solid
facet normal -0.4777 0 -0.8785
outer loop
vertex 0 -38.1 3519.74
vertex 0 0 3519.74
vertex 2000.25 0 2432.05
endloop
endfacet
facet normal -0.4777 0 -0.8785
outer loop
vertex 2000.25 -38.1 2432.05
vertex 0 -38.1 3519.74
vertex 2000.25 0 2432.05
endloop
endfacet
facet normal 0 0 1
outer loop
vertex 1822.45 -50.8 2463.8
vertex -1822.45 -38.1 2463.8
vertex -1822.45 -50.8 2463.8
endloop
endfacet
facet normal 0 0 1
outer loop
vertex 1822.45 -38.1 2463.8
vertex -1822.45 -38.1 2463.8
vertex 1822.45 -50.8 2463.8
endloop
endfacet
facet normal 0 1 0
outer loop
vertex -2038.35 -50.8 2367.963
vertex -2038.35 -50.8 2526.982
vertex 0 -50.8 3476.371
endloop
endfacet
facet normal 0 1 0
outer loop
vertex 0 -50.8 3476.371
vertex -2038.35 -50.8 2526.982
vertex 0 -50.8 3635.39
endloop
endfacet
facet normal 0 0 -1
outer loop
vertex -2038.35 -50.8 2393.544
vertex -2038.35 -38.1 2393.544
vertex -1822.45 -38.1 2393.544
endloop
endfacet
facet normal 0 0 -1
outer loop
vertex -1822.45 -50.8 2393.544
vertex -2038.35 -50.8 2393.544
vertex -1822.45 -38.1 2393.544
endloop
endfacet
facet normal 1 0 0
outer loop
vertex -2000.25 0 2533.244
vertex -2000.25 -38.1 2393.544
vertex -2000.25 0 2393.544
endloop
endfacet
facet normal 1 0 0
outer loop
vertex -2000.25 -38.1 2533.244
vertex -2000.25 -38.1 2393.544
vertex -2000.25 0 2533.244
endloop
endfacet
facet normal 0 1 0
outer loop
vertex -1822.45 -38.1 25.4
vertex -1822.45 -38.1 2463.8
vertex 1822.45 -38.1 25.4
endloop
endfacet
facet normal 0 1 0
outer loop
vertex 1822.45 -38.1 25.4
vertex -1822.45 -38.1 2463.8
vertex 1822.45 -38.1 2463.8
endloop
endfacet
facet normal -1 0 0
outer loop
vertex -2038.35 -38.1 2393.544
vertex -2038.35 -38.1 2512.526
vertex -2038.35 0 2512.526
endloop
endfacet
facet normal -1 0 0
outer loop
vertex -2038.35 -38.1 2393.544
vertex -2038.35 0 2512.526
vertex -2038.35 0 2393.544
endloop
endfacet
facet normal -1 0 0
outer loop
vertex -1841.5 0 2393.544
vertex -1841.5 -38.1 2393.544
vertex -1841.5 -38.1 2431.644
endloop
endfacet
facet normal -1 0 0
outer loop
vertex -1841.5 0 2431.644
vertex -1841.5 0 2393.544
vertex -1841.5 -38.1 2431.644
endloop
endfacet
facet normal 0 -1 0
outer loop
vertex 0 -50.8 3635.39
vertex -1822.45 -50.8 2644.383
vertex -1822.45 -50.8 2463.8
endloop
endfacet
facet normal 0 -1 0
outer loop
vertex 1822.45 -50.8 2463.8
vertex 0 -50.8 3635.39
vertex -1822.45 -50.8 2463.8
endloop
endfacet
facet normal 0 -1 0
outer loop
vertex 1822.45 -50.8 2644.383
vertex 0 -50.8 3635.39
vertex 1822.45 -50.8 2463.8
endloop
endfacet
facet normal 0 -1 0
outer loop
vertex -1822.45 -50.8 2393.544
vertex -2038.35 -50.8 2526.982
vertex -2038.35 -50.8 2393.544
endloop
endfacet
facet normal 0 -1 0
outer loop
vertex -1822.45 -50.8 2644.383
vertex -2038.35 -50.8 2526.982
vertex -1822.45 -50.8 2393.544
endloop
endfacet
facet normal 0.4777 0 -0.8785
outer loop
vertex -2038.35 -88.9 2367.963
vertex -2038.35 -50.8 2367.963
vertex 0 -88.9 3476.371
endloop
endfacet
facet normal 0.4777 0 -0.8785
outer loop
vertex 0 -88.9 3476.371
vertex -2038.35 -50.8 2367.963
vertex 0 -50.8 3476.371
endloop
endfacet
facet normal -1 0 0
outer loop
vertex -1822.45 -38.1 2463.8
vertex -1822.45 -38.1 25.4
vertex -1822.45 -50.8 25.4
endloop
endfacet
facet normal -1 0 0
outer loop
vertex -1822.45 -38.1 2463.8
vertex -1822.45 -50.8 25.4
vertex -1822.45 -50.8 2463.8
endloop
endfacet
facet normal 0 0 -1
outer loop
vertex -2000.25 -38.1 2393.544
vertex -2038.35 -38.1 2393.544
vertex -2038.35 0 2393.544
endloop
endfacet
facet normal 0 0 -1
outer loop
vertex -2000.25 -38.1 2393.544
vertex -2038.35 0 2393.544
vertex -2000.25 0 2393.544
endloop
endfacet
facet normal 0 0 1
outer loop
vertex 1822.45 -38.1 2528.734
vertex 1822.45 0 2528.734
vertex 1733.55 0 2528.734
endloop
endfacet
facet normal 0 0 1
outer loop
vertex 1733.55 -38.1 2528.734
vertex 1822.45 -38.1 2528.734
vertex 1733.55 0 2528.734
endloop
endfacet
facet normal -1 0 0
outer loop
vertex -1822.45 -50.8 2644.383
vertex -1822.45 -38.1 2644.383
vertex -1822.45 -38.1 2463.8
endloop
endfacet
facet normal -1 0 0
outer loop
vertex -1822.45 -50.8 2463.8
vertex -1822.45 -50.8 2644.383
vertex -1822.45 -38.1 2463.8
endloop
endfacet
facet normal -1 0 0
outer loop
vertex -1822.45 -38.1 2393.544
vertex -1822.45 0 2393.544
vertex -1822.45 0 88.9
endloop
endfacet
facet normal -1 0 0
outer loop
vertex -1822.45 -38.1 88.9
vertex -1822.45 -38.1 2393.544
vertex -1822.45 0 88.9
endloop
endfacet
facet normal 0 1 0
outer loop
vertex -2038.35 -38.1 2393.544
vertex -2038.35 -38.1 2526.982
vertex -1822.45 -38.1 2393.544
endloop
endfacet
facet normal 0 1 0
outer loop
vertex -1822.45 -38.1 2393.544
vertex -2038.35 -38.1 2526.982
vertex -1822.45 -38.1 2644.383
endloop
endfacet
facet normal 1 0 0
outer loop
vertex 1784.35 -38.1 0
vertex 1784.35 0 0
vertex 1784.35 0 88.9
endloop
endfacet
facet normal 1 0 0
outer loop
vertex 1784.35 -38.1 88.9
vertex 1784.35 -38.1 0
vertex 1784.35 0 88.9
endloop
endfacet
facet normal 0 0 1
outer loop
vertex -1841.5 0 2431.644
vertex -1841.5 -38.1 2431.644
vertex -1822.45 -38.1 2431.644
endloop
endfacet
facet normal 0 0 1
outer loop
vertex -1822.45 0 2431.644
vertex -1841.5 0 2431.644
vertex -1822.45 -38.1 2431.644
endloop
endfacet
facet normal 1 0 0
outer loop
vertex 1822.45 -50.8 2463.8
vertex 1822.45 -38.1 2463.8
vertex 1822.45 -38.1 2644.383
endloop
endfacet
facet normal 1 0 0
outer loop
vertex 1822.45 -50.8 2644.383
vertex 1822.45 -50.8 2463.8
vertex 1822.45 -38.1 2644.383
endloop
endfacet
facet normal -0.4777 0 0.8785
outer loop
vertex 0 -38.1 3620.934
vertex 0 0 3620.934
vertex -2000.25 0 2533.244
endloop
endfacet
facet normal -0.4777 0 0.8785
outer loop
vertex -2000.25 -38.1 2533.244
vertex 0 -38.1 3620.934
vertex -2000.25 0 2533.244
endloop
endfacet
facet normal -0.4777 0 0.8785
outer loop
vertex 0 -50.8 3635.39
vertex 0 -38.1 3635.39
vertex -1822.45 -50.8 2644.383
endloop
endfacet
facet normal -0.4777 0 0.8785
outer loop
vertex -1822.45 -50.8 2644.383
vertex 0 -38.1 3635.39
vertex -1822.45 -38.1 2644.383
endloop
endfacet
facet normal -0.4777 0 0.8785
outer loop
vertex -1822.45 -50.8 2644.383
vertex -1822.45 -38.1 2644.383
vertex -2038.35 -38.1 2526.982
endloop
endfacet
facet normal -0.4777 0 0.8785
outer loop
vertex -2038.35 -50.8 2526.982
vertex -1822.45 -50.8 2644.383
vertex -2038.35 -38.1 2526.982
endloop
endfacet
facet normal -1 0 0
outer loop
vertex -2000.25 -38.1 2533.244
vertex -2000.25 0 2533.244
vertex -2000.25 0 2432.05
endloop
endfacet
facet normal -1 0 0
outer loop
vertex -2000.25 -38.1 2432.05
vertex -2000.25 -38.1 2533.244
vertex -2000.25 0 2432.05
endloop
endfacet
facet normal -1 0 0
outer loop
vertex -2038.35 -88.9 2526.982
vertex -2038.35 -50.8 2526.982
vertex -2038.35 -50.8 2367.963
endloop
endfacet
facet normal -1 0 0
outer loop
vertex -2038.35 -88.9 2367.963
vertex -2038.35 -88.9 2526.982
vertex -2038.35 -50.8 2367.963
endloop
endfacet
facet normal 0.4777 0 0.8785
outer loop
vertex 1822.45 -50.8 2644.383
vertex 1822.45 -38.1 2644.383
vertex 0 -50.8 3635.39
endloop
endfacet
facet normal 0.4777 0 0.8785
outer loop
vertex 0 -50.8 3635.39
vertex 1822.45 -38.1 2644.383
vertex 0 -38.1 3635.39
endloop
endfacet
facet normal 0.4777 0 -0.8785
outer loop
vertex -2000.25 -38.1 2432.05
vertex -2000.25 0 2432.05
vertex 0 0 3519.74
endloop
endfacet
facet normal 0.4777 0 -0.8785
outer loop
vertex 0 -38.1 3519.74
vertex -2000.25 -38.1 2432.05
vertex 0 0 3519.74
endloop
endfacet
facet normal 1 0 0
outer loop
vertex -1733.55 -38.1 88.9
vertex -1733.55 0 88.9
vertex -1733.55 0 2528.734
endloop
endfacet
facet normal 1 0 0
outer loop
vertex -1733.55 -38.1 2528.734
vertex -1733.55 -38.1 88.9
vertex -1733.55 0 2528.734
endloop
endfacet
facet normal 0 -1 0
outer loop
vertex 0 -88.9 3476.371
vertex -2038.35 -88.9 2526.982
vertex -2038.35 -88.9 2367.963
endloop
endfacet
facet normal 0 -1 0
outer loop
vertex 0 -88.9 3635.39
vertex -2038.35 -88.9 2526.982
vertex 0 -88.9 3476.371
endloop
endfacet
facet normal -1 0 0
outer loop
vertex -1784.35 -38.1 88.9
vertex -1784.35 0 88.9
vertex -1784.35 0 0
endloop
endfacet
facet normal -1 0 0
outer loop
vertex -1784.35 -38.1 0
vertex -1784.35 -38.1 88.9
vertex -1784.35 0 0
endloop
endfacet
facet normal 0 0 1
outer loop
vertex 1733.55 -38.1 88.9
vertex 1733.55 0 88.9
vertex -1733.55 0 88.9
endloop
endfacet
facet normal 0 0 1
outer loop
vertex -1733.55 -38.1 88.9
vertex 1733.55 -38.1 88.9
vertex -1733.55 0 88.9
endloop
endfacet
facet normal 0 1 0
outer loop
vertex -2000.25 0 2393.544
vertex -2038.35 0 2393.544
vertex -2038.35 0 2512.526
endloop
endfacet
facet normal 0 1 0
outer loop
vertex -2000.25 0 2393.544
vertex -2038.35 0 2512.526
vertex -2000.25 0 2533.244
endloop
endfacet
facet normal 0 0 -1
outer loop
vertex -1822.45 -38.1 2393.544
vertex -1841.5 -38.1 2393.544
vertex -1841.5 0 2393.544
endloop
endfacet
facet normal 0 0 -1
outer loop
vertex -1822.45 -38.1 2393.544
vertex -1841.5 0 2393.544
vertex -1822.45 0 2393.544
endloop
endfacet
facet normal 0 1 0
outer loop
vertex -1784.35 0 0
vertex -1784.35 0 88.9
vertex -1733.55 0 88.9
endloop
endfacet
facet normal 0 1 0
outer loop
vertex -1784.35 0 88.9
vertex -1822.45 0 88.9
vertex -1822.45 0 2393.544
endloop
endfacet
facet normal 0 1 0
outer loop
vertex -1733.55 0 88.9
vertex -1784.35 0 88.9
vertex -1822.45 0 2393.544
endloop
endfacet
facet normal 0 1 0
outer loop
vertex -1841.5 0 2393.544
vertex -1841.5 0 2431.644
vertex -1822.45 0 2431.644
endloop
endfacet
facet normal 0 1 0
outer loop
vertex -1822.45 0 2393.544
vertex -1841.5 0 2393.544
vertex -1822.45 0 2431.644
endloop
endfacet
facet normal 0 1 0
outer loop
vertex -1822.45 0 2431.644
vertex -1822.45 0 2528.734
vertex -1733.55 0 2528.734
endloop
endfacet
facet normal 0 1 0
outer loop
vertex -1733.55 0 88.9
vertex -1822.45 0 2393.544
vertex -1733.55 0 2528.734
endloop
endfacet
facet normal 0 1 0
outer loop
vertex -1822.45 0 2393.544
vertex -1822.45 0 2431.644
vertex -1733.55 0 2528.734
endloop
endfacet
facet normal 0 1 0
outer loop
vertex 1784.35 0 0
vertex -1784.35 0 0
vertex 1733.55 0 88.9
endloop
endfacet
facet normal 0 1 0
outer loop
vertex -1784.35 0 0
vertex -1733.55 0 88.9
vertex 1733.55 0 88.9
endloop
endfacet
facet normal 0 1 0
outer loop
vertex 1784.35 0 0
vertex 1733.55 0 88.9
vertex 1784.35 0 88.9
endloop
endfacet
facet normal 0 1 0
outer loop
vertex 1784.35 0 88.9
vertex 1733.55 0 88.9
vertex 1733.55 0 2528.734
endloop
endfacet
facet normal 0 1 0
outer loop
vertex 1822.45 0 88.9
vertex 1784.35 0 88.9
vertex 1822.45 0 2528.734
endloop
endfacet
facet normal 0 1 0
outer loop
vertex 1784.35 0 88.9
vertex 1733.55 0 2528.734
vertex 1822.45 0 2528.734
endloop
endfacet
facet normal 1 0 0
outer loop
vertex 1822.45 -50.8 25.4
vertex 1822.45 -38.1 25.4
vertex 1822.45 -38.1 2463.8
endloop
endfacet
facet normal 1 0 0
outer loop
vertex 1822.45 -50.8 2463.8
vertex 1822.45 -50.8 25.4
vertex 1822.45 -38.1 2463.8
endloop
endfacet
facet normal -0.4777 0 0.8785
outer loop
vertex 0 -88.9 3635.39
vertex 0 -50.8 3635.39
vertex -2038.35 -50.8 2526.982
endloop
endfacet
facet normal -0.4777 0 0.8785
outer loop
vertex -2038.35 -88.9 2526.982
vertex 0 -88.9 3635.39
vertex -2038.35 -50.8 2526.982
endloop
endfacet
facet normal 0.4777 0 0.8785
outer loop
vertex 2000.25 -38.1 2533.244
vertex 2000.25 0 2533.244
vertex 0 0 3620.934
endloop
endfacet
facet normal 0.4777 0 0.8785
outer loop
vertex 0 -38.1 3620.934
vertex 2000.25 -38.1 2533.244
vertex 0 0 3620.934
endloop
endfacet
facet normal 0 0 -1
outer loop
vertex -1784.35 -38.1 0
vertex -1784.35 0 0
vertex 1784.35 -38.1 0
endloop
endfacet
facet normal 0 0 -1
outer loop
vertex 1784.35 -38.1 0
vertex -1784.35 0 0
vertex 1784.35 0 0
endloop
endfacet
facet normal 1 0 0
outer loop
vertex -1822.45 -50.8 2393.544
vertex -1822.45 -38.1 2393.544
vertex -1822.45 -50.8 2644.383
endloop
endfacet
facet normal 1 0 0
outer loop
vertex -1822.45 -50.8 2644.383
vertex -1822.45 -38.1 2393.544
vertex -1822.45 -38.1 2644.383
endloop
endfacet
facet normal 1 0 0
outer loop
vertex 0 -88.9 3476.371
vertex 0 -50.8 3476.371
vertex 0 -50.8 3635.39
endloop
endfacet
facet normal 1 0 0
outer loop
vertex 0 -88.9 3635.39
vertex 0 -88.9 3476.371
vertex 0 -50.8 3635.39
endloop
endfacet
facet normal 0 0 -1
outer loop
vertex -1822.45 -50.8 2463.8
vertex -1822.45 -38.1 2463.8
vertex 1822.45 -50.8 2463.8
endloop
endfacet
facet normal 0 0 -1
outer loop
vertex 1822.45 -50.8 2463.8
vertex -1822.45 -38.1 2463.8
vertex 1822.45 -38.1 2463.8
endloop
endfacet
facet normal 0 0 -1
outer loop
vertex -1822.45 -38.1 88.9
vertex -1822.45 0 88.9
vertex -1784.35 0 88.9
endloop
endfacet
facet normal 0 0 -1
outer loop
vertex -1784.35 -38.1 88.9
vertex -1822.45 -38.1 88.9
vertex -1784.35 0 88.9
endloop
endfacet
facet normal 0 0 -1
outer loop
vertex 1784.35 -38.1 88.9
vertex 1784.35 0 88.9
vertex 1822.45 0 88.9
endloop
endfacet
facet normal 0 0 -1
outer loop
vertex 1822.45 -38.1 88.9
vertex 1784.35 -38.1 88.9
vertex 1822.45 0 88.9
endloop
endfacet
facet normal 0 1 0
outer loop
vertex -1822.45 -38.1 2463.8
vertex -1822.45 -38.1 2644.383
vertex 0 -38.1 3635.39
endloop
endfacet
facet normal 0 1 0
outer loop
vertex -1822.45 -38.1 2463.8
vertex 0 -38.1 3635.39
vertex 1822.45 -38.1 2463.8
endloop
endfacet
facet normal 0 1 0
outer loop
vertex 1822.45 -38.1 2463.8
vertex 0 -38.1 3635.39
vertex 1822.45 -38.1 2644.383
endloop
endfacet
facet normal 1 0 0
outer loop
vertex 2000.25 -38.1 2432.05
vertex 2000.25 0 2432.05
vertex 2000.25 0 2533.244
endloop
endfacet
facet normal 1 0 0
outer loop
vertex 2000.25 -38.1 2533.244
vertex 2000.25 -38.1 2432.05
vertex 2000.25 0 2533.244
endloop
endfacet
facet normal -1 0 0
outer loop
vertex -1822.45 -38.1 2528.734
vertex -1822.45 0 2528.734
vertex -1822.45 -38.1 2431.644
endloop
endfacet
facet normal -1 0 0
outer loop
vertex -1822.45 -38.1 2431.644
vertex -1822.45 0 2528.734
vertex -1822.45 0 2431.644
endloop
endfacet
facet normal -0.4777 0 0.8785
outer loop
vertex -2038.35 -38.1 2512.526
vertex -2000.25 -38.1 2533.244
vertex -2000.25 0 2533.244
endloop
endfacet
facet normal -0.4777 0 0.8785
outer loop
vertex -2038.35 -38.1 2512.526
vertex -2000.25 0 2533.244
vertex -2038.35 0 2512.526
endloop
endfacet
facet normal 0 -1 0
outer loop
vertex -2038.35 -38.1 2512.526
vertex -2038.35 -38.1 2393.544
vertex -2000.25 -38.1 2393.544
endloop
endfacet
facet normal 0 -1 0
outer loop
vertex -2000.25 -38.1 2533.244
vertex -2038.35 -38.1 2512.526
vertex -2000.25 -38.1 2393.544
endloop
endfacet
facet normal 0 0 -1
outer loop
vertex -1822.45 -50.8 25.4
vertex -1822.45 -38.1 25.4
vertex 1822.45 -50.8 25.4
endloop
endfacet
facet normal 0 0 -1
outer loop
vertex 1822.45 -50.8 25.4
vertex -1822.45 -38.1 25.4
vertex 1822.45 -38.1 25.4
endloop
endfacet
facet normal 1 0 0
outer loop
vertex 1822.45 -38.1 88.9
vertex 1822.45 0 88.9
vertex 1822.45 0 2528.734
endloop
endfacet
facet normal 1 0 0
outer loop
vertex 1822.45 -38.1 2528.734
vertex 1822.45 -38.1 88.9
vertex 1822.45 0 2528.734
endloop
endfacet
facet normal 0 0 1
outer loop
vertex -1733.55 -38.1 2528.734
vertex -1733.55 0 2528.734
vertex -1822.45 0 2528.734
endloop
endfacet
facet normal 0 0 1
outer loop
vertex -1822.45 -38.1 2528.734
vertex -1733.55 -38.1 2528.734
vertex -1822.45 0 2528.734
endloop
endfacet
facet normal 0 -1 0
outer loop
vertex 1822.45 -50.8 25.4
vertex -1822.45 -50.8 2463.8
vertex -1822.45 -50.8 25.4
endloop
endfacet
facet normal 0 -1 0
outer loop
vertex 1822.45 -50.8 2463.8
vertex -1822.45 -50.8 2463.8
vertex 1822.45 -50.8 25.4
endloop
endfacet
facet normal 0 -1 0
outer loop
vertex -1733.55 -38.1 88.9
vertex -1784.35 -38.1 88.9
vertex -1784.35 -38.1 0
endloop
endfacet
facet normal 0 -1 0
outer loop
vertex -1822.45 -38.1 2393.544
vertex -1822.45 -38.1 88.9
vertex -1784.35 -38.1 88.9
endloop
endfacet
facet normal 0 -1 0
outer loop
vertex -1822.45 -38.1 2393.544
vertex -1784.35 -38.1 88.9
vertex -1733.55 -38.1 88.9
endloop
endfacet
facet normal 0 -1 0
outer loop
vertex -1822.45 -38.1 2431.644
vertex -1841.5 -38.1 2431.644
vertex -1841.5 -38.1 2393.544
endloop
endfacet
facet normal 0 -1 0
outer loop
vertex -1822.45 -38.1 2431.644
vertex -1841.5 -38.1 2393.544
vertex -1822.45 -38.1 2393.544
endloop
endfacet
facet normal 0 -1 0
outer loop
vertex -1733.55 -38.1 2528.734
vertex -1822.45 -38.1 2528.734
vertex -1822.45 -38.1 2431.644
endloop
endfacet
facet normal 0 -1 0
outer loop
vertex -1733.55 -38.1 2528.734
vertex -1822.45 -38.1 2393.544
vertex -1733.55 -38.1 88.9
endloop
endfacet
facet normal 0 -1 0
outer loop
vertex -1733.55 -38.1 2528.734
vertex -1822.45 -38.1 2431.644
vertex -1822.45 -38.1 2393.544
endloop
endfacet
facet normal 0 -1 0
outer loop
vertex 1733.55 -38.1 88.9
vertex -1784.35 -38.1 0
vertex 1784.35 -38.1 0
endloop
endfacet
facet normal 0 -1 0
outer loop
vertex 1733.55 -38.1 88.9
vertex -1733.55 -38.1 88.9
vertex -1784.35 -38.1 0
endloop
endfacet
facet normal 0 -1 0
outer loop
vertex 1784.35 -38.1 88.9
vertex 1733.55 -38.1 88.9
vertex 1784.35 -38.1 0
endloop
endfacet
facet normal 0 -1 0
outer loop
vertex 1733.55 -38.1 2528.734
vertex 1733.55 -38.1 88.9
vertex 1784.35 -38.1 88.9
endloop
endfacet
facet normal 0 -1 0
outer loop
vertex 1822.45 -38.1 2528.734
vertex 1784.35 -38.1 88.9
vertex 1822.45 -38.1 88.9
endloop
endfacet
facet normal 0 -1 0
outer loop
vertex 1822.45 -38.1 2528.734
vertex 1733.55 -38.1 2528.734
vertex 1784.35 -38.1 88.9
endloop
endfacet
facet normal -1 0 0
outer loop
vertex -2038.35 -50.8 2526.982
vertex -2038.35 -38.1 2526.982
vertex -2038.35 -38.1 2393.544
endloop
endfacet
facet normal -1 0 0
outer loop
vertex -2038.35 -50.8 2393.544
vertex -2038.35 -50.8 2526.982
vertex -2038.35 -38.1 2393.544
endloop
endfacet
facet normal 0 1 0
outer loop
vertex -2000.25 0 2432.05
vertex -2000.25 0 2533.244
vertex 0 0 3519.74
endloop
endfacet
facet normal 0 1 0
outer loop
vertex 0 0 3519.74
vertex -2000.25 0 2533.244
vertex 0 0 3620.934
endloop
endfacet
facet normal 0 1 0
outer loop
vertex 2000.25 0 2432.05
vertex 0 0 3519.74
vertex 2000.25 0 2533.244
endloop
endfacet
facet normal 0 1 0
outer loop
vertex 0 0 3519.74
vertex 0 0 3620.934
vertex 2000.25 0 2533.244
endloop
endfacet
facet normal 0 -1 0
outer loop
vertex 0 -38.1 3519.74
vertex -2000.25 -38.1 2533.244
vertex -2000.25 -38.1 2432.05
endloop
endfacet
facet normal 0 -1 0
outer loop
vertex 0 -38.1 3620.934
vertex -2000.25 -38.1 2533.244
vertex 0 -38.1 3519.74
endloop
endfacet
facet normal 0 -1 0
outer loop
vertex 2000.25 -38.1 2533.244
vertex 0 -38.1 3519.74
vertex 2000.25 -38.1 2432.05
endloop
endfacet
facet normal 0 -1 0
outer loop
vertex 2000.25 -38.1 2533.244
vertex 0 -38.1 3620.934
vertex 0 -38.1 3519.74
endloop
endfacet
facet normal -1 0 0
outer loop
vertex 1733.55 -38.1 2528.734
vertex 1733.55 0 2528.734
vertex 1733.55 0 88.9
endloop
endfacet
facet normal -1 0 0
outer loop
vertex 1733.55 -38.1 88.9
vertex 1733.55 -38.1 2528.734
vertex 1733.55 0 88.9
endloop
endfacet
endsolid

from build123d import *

# Parameters (mm, degrees)
F1_DEPTH  = 38.1
F2_W      = 3644.9
F2_H      = 2438.4
F3_DEPTH  = 12.7
F5_DEPTH  = 12.7
F7_DEPTH  = 38.1
F8_W      = 19.05
F8_H      = 38.1
F9_DEPTH  = 38.1
F11_DEPTH = 38.1
F13_DEPTH = 12.7


with BuildPart() as f1:
    # F0 (on Front) → F1 (new body)
    with BuildSketch(Plane.XZ):
        Polygon((-2000.25, 2432.05), (-1822.45, 2528.733554711), (0, 3519.7399904992), (1822.45, 2528.733554711), (2000.25, 2432.05), (2000.25, 2533.2435642118), (0, 3620.933554711), (-2000.25, 2533.2435642118), align=None)
    extrude(amount=F1_DEPTH)


with BuildPart() as f1b:
    # F0 (on Front) → F1, piece 2 (new body)
    with BuildSketch(Plane.XZ):
        Polygon((1733.55, 88.9), (1784.35, 88.9), (1822.45, 88.9), (1822.45, 2528.733554711), (1733.55, 2528.733554711), align=None)
        Polygon((-1822.45, 88.9), (-1784.35, 88.9), (-1733.55, 88.9), (-1733.55, 2528.733554711), (-1822.45, 2528.733554711), align=None)
        Polygon((-1784.35, 88.9), (-1784.35, 0), (1784.35, 0), (1784.35, 88.9), (1733.55, 88.9), (-1733.55, 88.9), align=None)
    extrude(amount=F1_DEPTH)

    # F8 (on face) → F9 (join)
    with BuildSketch(Plane.XZ.offset(38.1)):
        with Locations((-1831.975, 2412.5935642118)):
            Rectangle(F8_W, F8_H)
    extrude(amount=-F9_DEPTH)


with BuildPart() as f3:
    # F2 (on face) → F3 (new body)
    with BuildSketch(Plane.XZ.offset(38.1)):
        with Locations((0, 1244.6)):
            Rectangle(F2_W, F2_H)
    extrude(amount=F3_DEPTH)


with BuildPart() as f5:
    # F4 (on face) → F5 (new body)
    with BuildSketch(Plane.XZ.offset(38.1)):
        Polygon((-1822.45, 2644.3833423817), (-1822.45, 2463.8), (1822.45, 2463.8), (1822.45, 2644.3833423817), (0, 3635.3897781699), align=None)
    extrude(amount=F5_DEPTH)


with BuildPart() as f7:
    # F6 (on face) → F7 (new body)
    with BuildSketch(Plane.XZ.offset(38.1)):
        Polygon((-2000.25, 2393.5435642118), (-2000.25, 2533.2435642118), (-2038.35, 2512.5256596309), (-2038.35, 2393.5435642118), align=None)
    extrude(amount=-F7_DEPTH)


with BuildPart() as f11:
    # F10 (on face) → F11 (new body)
    with BuildSketch(Plane.XZ.offset(50.8)):
        Polygon((0, 3476.3713201227), (0, 3635.3897781699), (-2038.35, 2526.9818830897), (-2038.35, 2367.9634250426), align=None)
    extrude(amount=F11_DEPTH)


with BuildPart() as f13:
    # F12 (on face) → F13 (new body)
    with BuildSketch(Plane.XZ.offset(38.1)):
        Polygon((-1822.45, 2644.3833423817), (-2038.35, 2526.9818830897), (-2038.35, 2393.5435642118), (-1822.45, 2393.5435642118), align=None)
    extrude(amount=F13_DEPTH)


solid = Compound([f1.part, f1b.part, f3.part, f5.part, f7.part, f11.part, f13.part])
